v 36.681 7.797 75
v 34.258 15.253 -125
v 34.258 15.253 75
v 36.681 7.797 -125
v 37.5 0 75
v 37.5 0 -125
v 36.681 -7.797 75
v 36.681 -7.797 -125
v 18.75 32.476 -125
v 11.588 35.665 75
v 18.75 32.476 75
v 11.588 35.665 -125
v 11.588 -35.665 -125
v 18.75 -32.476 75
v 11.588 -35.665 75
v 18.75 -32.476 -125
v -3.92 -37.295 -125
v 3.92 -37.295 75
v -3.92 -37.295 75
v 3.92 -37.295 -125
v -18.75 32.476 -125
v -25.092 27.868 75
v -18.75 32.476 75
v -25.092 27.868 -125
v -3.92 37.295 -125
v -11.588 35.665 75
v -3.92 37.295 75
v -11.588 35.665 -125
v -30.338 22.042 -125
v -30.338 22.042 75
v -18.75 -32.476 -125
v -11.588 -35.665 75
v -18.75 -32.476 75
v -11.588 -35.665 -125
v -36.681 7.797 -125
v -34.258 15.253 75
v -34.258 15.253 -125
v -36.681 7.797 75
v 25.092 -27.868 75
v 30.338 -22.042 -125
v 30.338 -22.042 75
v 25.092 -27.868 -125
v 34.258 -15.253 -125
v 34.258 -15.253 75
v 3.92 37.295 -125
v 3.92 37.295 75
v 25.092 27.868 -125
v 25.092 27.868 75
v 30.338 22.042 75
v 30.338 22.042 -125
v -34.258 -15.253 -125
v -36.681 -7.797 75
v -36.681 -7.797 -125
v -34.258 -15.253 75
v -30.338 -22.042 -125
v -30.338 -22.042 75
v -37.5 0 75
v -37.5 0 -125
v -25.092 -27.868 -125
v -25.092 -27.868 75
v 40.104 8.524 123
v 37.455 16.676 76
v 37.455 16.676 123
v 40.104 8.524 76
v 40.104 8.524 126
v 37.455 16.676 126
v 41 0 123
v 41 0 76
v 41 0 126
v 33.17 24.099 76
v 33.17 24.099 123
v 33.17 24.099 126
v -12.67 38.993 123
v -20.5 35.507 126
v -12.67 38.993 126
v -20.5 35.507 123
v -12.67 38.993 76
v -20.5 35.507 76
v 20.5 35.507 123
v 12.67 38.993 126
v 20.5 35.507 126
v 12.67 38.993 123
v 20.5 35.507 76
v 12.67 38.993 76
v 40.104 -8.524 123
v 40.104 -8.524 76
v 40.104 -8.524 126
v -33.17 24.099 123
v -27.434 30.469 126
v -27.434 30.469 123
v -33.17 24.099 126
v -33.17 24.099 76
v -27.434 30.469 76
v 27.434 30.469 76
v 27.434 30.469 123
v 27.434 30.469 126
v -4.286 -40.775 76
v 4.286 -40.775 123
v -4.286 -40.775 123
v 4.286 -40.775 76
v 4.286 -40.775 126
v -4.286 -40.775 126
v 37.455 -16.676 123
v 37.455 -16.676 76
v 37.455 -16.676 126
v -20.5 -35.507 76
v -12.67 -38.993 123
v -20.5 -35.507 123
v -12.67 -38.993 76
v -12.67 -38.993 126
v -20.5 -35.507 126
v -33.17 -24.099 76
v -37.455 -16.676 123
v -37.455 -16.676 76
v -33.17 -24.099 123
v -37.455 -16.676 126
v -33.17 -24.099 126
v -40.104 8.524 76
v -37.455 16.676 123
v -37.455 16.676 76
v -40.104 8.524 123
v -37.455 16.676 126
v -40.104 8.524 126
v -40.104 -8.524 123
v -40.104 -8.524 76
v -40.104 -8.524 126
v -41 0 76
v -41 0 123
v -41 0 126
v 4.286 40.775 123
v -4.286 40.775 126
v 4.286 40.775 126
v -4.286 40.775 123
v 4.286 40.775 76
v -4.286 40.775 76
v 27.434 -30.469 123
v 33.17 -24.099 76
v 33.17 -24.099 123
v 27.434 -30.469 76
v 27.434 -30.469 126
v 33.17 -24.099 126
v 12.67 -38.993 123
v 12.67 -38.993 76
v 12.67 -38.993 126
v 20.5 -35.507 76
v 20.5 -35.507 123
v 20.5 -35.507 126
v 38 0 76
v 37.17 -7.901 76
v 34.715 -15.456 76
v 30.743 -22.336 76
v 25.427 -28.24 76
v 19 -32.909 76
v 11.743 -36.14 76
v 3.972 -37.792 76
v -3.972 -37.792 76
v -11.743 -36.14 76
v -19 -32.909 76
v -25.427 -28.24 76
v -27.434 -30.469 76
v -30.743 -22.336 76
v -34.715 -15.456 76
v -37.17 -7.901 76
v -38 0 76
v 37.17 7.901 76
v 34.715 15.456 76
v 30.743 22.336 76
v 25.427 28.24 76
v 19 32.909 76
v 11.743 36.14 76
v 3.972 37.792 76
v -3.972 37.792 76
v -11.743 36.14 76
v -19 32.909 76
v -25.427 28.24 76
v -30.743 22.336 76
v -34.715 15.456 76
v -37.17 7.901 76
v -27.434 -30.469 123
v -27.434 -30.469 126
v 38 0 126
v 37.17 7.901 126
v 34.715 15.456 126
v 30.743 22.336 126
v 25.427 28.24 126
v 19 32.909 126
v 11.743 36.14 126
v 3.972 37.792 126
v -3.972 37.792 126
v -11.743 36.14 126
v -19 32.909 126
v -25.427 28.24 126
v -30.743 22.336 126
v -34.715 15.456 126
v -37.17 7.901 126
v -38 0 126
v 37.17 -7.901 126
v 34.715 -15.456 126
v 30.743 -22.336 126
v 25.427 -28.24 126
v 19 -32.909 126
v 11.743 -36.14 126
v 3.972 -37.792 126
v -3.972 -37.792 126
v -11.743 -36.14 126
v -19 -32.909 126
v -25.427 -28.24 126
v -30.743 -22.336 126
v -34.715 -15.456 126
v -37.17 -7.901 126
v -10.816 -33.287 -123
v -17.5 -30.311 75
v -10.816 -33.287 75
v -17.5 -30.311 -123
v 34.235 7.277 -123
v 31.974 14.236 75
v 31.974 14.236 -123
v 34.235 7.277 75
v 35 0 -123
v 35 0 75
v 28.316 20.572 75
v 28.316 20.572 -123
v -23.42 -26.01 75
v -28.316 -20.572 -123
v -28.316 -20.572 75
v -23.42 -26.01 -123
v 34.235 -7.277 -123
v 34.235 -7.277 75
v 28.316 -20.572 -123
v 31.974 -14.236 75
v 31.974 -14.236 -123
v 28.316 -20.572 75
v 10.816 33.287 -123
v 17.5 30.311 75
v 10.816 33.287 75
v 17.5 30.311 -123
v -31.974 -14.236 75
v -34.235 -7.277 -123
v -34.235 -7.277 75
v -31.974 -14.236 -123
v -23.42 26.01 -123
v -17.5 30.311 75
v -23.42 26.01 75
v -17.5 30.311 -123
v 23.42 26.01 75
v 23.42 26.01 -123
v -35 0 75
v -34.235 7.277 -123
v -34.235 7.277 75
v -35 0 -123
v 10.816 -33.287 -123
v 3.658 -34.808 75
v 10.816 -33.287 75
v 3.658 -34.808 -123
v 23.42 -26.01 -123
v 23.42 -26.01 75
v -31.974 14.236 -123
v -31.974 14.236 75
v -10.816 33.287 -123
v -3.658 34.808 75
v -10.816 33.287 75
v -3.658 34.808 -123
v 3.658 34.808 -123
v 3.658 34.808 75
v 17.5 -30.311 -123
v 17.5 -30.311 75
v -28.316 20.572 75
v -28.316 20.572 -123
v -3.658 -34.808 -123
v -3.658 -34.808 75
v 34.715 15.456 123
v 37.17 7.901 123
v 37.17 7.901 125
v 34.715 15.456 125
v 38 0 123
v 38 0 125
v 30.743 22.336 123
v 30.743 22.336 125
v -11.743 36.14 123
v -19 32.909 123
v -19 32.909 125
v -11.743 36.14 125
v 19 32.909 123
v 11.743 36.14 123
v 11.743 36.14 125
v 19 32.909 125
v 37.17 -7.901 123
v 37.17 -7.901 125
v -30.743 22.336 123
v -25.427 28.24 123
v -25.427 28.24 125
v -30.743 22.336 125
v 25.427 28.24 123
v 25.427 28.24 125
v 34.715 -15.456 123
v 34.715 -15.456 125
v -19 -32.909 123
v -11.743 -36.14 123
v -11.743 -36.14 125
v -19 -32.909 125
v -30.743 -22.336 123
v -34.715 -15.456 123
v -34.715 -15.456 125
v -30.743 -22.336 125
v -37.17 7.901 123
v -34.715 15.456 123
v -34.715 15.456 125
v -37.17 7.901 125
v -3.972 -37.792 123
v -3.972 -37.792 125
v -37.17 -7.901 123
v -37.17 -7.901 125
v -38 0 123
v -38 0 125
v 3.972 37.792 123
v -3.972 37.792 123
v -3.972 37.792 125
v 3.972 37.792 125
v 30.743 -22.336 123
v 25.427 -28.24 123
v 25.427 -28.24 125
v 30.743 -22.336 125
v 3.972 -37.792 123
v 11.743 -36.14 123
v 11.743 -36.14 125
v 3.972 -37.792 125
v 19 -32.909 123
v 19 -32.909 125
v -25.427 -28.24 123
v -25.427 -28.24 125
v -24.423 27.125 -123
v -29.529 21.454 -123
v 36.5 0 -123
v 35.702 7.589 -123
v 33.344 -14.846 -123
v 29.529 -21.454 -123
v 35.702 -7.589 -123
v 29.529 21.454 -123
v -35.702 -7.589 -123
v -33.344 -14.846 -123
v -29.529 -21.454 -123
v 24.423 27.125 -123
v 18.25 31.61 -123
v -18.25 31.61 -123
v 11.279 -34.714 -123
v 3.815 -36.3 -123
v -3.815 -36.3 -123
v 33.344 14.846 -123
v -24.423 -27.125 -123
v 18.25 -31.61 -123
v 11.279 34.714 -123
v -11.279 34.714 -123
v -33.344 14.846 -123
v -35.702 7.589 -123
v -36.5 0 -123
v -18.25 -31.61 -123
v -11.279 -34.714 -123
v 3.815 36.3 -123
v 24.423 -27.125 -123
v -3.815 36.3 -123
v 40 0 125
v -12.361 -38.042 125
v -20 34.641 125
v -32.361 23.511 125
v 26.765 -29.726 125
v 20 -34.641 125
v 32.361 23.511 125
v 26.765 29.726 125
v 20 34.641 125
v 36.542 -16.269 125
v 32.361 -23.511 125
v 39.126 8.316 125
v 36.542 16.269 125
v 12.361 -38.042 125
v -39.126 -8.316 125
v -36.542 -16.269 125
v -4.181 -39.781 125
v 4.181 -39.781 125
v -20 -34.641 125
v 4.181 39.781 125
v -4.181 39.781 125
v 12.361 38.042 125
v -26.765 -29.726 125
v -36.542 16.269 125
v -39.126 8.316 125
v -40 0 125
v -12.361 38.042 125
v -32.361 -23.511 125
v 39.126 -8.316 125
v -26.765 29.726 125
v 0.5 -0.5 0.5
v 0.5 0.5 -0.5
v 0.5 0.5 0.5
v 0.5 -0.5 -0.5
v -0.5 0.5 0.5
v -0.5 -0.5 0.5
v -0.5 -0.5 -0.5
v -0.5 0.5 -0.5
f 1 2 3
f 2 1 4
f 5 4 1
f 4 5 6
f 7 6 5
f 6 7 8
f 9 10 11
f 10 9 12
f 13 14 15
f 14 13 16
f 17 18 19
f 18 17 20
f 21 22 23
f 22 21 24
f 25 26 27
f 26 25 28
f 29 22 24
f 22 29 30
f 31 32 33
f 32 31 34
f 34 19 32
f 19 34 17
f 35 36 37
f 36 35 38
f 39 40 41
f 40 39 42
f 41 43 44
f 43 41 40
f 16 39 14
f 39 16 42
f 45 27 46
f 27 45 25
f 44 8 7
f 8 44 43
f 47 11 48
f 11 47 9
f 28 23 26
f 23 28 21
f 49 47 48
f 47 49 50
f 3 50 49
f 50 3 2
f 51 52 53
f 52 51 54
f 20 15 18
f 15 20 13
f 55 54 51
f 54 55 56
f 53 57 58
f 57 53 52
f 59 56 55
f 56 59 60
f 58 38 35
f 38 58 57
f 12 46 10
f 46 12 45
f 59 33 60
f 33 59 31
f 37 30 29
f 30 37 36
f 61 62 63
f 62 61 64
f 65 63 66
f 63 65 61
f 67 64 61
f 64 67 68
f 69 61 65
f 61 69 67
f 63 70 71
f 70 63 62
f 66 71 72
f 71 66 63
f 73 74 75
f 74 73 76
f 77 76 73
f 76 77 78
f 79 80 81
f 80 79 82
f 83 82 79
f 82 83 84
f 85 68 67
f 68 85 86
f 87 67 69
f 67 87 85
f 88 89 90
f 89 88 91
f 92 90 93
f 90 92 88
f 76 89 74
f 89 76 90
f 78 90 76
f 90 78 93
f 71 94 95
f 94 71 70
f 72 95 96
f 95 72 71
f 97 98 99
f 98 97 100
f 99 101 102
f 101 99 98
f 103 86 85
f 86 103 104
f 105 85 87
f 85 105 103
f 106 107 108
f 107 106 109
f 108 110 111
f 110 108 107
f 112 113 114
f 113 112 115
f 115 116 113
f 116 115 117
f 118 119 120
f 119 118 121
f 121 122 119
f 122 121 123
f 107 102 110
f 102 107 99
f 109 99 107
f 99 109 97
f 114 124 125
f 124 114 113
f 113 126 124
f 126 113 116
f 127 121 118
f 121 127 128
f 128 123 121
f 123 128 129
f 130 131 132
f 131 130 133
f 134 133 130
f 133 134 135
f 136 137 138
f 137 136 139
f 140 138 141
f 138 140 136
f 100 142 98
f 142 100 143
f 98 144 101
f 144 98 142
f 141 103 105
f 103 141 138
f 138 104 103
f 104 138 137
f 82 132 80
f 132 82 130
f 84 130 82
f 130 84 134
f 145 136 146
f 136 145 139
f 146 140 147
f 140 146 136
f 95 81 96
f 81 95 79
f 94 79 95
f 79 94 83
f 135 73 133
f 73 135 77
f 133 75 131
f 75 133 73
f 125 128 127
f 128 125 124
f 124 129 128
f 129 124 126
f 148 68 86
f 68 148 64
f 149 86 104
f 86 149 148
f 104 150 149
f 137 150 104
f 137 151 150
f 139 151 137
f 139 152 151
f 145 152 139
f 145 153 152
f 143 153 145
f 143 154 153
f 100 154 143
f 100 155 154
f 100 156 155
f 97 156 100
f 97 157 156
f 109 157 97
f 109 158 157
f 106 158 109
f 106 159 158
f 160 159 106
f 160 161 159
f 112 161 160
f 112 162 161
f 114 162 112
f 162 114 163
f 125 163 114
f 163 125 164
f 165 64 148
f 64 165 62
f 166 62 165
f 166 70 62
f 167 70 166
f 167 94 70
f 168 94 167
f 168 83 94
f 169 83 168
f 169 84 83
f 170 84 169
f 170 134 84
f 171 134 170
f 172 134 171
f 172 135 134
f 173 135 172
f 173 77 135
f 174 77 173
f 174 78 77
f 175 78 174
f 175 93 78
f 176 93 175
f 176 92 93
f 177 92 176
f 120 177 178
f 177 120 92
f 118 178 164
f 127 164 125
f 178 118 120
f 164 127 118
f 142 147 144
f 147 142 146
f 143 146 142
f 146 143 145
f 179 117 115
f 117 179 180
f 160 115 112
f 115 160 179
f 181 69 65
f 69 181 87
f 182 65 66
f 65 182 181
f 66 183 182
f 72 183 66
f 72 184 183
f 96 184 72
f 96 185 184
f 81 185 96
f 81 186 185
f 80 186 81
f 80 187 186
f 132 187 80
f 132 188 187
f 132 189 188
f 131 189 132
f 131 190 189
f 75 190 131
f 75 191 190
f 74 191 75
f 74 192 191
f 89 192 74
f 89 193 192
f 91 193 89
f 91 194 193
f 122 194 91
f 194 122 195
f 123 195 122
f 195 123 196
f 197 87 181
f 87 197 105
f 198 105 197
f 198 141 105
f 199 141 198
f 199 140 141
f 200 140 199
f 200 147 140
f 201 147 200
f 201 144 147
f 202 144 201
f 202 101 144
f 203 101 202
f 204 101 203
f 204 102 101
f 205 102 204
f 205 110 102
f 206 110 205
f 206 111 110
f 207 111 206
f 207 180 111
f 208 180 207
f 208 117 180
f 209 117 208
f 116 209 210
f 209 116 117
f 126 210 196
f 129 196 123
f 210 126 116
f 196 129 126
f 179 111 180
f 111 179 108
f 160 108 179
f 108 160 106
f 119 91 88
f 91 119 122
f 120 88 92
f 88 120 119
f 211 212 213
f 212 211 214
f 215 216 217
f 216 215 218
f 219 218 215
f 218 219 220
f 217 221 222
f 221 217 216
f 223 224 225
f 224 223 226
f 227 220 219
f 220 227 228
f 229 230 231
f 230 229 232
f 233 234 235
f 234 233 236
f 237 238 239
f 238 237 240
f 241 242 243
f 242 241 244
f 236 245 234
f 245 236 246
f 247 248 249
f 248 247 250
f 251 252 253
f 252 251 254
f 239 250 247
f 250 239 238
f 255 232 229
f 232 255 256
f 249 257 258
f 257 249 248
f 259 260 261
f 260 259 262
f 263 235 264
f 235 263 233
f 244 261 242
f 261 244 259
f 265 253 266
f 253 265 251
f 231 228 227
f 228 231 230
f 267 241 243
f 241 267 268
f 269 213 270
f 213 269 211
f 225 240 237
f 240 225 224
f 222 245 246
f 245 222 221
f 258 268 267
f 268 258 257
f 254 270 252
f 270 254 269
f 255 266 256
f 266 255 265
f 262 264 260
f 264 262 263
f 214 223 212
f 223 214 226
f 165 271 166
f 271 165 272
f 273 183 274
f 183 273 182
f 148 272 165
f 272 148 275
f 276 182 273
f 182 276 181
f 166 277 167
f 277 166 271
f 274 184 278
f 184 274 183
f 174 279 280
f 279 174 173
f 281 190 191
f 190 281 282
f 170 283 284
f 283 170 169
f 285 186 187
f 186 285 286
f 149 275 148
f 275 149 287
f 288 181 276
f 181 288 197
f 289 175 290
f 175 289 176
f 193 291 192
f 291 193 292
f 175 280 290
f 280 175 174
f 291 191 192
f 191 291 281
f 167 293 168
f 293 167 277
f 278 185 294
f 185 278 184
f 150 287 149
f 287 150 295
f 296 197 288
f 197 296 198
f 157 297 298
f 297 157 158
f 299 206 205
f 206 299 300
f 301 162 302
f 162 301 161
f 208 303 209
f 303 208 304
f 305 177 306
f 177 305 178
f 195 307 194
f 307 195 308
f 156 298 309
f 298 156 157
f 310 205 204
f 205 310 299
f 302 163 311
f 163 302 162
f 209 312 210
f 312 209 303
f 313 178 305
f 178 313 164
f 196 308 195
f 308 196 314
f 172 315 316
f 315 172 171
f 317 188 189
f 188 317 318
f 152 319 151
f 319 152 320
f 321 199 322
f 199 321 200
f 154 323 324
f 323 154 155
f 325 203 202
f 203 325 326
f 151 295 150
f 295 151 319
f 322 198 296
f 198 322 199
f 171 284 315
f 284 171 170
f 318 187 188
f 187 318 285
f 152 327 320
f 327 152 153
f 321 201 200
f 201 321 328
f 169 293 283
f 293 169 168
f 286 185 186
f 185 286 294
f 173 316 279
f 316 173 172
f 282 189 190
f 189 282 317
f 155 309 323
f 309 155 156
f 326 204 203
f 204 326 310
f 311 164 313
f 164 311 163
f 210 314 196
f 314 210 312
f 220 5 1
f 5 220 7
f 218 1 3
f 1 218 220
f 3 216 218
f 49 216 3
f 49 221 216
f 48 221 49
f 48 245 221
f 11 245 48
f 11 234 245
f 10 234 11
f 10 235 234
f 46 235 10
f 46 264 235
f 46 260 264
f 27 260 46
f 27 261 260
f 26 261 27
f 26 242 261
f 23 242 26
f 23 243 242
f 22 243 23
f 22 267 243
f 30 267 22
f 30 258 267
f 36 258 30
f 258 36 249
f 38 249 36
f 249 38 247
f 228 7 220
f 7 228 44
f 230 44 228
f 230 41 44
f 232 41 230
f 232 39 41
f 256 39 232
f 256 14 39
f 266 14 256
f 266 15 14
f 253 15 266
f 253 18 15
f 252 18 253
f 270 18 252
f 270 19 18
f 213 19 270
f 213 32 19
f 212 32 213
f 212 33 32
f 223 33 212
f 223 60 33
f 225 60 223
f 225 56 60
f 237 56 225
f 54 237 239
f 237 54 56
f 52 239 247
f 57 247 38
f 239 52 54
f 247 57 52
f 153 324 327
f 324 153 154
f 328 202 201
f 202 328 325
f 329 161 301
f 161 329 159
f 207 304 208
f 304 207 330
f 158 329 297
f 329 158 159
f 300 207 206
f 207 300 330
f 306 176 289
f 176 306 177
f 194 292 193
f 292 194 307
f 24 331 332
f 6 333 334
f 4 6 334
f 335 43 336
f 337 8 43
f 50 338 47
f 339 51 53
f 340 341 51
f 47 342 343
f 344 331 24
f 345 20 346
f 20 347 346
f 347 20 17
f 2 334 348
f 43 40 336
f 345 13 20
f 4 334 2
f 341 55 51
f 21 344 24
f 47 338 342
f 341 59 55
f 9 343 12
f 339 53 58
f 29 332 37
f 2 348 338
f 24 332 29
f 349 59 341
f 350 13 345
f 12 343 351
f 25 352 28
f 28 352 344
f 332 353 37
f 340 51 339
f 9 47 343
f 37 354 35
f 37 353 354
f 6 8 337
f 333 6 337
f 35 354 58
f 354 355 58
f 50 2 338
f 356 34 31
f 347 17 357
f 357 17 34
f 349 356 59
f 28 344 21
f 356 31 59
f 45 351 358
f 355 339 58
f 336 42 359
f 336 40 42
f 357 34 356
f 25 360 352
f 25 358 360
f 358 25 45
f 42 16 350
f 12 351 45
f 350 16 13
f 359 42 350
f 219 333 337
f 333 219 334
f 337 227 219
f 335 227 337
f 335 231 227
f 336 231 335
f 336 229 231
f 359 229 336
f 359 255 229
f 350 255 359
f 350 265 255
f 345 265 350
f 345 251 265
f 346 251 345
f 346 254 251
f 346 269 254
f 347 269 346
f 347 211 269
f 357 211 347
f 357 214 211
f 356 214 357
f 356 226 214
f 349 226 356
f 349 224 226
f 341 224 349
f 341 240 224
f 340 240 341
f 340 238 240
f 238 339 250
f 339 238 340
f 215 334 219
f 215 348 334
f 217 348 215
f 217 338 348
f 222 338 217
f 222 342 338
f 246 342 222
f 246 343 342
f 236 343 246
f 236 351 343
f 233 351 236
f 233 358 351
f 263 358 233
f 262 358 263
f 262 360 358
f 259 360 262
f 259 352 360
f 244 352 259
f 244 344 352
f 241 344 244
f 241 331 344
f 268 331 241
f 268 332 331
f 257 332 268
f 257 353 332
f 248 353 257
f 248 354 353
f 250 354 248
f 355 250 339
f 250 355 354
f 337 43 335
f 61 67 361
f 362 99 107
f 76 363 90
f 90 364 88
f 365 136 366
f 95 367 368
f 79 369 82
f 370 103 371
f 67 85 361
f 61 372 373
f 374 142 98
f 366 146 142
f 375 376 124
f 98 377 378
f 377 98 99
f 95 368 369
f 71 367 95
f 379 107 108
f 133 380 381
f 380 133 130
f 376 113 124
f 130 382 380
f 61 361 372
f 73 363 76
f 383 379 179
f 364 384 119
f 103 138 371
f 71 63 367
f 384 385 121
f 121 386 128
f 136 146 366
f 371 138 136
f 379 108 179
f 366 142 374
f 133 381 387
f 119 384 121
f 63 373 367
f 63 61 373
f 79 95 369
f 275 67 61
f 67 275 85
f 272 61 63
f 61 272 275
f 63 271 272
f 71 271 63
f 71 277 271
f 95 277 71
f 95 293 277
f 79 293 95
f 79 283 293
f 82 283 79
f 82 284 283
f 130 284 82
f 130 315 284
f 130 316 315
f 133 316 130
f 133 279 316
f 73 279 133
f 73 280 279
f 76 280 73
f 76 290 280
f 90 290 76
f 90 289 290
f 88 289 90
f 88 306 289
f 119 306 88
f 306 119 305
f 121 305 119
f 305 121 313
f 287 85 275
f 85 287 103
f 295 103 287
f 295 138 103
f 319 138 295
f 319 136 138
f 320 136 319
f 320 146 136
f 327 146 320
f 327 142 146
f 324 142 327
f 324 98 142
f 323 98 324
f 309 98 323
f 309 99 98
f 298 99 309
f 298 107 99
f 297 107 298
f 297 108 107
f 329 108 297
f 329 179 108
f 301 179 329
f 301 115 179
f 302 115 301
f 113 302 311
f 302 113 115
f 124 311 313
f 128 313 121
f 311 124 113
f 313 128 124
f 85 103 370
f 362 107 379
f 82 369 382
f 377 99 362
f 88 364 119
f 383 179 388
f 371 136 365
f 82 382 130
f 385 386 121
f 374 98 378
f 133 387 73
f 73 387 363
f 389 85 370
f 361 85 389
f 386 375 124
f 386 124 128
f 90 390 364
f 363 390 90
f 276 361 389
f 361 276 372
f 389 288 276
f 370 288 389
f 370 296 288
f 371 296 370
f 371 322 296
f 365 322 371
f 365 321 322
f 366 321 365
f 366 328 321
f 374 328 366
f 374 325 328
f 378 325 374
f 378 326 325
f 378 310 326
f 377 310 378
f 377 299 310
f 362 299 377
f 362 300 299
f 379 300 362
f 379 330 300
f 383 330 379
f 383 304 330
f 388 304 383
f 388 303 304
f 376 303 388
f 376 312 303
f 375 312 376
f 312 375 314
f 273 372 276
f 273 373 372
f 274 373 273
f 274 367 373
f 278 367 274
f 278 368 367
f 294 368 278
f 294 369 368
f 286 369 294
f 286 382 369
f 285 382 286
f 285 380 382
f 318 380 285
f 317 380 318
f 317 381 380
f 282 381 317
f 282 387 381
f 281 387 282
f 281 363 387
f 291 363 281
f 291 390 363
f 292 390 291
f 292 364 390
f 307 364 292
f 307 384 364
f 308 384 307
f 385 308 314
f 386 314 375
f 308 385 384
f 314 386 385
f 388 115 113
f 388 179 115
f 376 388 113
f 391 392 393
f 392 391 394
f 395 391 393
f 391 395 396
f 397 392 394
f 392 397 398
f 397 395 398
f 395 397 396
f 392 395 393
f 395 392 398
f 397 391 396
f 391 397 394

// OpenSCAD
// Parameters
pipe_length = 250; //[125:500:1]
outer_diameter = 75; //[40:150:1]
wall_thickness = 2.5; //[1.2:5:0.1]
socket_length = 50; //[25:100:1]
socket_outer_diameter = 82; //[76:100:1]
socket_wall_thickness = 3; //[1.5:6:0.1]
chamfer_length = 2; //[0.5:5:0.1]
chamfer_radial = 1; //[0.5:3:0.1]
overlap = 1; //[0.5:2:0.1]

// Base Shapes
module pipe_body() {
  translate([0, 0, 0])
    cylinder(h=pipe_length, r=outer_diameter/2, center=true);
}

module inner_bore() {
  translate([0, 0, 0])
    cylinder(h=pipe_length + 2*overlap, r=outer_diameter/2 - wall_thickness, center=true);
}

module socket_end() {
  translate([0, 0, pipe_length/2 - socket_length/2 + overlap])
    cylinder(h=socket_length, r=socket_outer_diameter/2, center=true);
}

module socket_inner_bore() {
  translate([0, 0, pipe_length/2 - socket_length/2 + overlap])
    cylinder(h=socket_length + 2*overlap, r=socket_outer_diameter/2 - socket_wall_thickness, center=true);
}

module chamfer_spigot_outer() {
  translate([0, 0, -pipe_length/2 + chamfer_length/2])
    cylinder(h=chamfer_length, r1=outer_diameter/2, r2=outer_diameter/2 - chamfer_radial, center=true);
}

module chamfer_socket_outer() {
  translate([0, 0, pipe_length/2 - chamfer_length/2])
    cylinder(h=chamfer_length, r1=socket_outer_diameter/2, r2=socket_outer_diameter/2 - chamfer_radial, center=true);
}

module markings_text() {
  translate([0, 0, 0])
    cube([overlap, overlap, overlap], center=true);
}

// Operations
module op_union_outer() {
  union() {
    pipe_body();
    socket_end();
  }
}

module op_union_bores() {
  union() {
    inner_bore();
    socket_inner_bore();
  }
}

module op_hollow_pipe() {
  difference() {
    op_union_outer();
    op_union_bores();
  }
}

module op_union_chamfers() {
  union() {
    chamfer_spigot_outer();
    chamfer_socket_outer();
  }
}

module op_apply_chamfers() {
  difference() {
    op_hollow_pipe();
    op_union_chamfers();
  }
}

module op_final_union() {
  union() {
    op_apply_chamfers();
    markings_text();
  }
}

// Final Output
op_final_union();
